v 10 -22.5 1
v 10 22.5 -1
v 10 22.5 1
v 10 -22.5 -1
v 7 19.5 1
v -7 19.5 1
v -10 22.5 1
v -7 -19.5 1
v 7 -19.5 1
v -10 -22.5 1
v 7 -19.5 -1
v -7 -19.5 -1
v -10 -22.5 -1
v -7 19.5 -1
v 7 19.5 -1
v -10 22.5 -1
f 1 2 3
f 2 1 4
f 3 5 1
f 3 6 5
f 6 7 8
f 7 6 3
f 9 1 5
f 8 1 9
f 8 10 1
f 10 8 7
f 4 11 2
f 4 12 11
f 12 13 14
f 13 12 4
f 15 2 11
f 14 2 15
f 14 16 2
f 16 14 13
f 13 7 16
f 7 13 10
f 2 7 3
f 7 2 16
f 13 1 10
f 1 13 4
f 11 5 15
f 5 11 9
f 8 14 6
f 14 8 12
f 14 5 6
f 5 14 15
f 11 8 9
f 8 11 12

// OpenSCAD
// file: controller.scad
w_back = 70;
h_back = 45;
w_controller = 20;
thickness_bottom = 2;
thickness_top = 2;
widht_frame_window = 3;

h_walls = 4;
thickness_walls = 2;
gap_backligh = 1.5;

//kit_controller();
//walls(); 
//debug_controller();
test_print_walls_frame();

module test_print_walls_frame() {
    frame_controller();
    translate([-w_controller-widht_frame_window-2, 0, h_walls/2])
    walls();
}

module frame_controller() {
difference() {
    cube([w_controller, h_back, thickness_top], center=true);
    cube([w_controller-2*widht_frame_window, h_back-2*widht_frame_window, thickness_top+1], center=true);
 }
}

module debug_controller() {
difference() {
    kit_controller();
    translate([-w_controller/2, 0, h_walls/2])
    cube([w_controller, h_back+2*thickness_walls+gap_backligh   +1, 2*h_walls], center=true);
 }
}
module kit_controller() {
    controller();
    translate([0, 0, h_walls/2])
    walls(); 
    color("green")
    translate([0, 0, thickness_bottom+0.1])
    frame_controller();
}

module walls() {
difference() {
    cube([w_controller + 2*thickness_walls+gap_backligh, h_back + 2*thickness_walls+gap_backligh, thickness_bottom + h_walls], center=true);
    color("red")
    cube([w_controller+gap_backligh, h_back+gap_backligh, thickness_bottom + h_walls + 1], center=true);
    translate([-w_controller-thickness_walls+gap_backligh/2-0.25, 0, 0])
    cube([w_controller+gap_backligh, h_back+gap_backligh+2*thickness_walls+1, thickness_bottom+h_walls+1], center=true);
 }
}

module controller(){
cube([w_controller+gap_backligh, h_back+gap_backligh, thickness_bottom], center=true);
}
// file: akkum18650.scad
echo("Работа Полина Тугбаева");
d_akkum=18;
h_akkum=65;

akkum18650();

module akkum18650() {
color("purple")
cylinder(d=d_akkum, h=h_akkum, $fn=32, center=true);
}
// main file
use <akkum18650.scad>
use <controller.scad>

echo("Работа Полина Тугбаева");
d_akkum=18;
h_akkum=65;
d_wires=1.2;

thickness_frame = 4;
thickness_walls = 2;
thickness_bottom = 2;
thickness_top = 2;
widht_frame_window = 3;

w_back = 70;
h_back = 45;
thickness_back = 1;
h_walls = 4;
gap_backlight = 1.5;
w_controller = 20;

//kit_frame();

frame_controller();
//translate([1, 0, 0])
//debug_controller(); 
//frame_debug(); 
//translate([0, 0, thickness_bottom/2+thickness_top/2])
//window_frame();
//walls();

module for_wires() {
    for(i=[1:6]) {
        echo("i = ", i);
        translate([i*3, 0, 0])
        color("red")
        cylinder(h=30, d=2, center=true, $fn=32);
 }
}

module window_frame(){
difference() {
    color("green")
    cube([w_back, h_back, thickness_top], center=true);
    color("red")
    cube([w_back-2*widht_frame_window, h_back-2*widht_frame_window, thickness_top+1], center=true);
 }
}

module frame_debug() {
difference() {
    kit_frame();
    translate([w_back/2, 0, h_walls-thickness_bottom])
    cube([w_back, h_back+2*thickness_walls+2, 2*h_walls], center=true);
 }
}
    
module kit_frame(){
    bottom();
    //color("green")
    translate([0,0,h_walls/2+thickness_bottom/2])
    walls();
    wires();
    translate([0, 0, thickness_bottom/2+thickness_top/2+0.1])
    window_frame();
    translate([w_back/2+w_controller/2+2*thickness_walls-0.51, 0,])
    kit_controller();
}

module wires() {
    translate([w_back/2, -h_back/2+6, h_walls/2+0.5])
    rotate([0, 90, 0])
    color("red")
    cylinder(d=d_wires, h=25, center=true, $fn=25);
    
    translate([w_back/2, -h_back/2+2, h_walls/2+0.5])
    rotate([0, 90, 0])
    color("black")
    cylinder(d=d_wires, h=25, center=true, $fn=25);
}

module walls(){
    difference(){
        cube([w_back+2*thickness_walls+gap_backlight, h_back+2*thickness_walls+gap_backlight, h_walls], center = true);
        color("red")
        cube([w_back+gap_backlight, h_back+gap_backlight, h_walls+1], center = true);
    }
}
module backlight(){
    color("lightgreen")
    cube([w_back, h_back, thickness_back], center = true);
}

module bottom(){
    cube([w_back+2*thickness_walls+gap_backlight, h_back+2*thickness_walls+gap_backlight, thickness_bottom], center = true);
}
